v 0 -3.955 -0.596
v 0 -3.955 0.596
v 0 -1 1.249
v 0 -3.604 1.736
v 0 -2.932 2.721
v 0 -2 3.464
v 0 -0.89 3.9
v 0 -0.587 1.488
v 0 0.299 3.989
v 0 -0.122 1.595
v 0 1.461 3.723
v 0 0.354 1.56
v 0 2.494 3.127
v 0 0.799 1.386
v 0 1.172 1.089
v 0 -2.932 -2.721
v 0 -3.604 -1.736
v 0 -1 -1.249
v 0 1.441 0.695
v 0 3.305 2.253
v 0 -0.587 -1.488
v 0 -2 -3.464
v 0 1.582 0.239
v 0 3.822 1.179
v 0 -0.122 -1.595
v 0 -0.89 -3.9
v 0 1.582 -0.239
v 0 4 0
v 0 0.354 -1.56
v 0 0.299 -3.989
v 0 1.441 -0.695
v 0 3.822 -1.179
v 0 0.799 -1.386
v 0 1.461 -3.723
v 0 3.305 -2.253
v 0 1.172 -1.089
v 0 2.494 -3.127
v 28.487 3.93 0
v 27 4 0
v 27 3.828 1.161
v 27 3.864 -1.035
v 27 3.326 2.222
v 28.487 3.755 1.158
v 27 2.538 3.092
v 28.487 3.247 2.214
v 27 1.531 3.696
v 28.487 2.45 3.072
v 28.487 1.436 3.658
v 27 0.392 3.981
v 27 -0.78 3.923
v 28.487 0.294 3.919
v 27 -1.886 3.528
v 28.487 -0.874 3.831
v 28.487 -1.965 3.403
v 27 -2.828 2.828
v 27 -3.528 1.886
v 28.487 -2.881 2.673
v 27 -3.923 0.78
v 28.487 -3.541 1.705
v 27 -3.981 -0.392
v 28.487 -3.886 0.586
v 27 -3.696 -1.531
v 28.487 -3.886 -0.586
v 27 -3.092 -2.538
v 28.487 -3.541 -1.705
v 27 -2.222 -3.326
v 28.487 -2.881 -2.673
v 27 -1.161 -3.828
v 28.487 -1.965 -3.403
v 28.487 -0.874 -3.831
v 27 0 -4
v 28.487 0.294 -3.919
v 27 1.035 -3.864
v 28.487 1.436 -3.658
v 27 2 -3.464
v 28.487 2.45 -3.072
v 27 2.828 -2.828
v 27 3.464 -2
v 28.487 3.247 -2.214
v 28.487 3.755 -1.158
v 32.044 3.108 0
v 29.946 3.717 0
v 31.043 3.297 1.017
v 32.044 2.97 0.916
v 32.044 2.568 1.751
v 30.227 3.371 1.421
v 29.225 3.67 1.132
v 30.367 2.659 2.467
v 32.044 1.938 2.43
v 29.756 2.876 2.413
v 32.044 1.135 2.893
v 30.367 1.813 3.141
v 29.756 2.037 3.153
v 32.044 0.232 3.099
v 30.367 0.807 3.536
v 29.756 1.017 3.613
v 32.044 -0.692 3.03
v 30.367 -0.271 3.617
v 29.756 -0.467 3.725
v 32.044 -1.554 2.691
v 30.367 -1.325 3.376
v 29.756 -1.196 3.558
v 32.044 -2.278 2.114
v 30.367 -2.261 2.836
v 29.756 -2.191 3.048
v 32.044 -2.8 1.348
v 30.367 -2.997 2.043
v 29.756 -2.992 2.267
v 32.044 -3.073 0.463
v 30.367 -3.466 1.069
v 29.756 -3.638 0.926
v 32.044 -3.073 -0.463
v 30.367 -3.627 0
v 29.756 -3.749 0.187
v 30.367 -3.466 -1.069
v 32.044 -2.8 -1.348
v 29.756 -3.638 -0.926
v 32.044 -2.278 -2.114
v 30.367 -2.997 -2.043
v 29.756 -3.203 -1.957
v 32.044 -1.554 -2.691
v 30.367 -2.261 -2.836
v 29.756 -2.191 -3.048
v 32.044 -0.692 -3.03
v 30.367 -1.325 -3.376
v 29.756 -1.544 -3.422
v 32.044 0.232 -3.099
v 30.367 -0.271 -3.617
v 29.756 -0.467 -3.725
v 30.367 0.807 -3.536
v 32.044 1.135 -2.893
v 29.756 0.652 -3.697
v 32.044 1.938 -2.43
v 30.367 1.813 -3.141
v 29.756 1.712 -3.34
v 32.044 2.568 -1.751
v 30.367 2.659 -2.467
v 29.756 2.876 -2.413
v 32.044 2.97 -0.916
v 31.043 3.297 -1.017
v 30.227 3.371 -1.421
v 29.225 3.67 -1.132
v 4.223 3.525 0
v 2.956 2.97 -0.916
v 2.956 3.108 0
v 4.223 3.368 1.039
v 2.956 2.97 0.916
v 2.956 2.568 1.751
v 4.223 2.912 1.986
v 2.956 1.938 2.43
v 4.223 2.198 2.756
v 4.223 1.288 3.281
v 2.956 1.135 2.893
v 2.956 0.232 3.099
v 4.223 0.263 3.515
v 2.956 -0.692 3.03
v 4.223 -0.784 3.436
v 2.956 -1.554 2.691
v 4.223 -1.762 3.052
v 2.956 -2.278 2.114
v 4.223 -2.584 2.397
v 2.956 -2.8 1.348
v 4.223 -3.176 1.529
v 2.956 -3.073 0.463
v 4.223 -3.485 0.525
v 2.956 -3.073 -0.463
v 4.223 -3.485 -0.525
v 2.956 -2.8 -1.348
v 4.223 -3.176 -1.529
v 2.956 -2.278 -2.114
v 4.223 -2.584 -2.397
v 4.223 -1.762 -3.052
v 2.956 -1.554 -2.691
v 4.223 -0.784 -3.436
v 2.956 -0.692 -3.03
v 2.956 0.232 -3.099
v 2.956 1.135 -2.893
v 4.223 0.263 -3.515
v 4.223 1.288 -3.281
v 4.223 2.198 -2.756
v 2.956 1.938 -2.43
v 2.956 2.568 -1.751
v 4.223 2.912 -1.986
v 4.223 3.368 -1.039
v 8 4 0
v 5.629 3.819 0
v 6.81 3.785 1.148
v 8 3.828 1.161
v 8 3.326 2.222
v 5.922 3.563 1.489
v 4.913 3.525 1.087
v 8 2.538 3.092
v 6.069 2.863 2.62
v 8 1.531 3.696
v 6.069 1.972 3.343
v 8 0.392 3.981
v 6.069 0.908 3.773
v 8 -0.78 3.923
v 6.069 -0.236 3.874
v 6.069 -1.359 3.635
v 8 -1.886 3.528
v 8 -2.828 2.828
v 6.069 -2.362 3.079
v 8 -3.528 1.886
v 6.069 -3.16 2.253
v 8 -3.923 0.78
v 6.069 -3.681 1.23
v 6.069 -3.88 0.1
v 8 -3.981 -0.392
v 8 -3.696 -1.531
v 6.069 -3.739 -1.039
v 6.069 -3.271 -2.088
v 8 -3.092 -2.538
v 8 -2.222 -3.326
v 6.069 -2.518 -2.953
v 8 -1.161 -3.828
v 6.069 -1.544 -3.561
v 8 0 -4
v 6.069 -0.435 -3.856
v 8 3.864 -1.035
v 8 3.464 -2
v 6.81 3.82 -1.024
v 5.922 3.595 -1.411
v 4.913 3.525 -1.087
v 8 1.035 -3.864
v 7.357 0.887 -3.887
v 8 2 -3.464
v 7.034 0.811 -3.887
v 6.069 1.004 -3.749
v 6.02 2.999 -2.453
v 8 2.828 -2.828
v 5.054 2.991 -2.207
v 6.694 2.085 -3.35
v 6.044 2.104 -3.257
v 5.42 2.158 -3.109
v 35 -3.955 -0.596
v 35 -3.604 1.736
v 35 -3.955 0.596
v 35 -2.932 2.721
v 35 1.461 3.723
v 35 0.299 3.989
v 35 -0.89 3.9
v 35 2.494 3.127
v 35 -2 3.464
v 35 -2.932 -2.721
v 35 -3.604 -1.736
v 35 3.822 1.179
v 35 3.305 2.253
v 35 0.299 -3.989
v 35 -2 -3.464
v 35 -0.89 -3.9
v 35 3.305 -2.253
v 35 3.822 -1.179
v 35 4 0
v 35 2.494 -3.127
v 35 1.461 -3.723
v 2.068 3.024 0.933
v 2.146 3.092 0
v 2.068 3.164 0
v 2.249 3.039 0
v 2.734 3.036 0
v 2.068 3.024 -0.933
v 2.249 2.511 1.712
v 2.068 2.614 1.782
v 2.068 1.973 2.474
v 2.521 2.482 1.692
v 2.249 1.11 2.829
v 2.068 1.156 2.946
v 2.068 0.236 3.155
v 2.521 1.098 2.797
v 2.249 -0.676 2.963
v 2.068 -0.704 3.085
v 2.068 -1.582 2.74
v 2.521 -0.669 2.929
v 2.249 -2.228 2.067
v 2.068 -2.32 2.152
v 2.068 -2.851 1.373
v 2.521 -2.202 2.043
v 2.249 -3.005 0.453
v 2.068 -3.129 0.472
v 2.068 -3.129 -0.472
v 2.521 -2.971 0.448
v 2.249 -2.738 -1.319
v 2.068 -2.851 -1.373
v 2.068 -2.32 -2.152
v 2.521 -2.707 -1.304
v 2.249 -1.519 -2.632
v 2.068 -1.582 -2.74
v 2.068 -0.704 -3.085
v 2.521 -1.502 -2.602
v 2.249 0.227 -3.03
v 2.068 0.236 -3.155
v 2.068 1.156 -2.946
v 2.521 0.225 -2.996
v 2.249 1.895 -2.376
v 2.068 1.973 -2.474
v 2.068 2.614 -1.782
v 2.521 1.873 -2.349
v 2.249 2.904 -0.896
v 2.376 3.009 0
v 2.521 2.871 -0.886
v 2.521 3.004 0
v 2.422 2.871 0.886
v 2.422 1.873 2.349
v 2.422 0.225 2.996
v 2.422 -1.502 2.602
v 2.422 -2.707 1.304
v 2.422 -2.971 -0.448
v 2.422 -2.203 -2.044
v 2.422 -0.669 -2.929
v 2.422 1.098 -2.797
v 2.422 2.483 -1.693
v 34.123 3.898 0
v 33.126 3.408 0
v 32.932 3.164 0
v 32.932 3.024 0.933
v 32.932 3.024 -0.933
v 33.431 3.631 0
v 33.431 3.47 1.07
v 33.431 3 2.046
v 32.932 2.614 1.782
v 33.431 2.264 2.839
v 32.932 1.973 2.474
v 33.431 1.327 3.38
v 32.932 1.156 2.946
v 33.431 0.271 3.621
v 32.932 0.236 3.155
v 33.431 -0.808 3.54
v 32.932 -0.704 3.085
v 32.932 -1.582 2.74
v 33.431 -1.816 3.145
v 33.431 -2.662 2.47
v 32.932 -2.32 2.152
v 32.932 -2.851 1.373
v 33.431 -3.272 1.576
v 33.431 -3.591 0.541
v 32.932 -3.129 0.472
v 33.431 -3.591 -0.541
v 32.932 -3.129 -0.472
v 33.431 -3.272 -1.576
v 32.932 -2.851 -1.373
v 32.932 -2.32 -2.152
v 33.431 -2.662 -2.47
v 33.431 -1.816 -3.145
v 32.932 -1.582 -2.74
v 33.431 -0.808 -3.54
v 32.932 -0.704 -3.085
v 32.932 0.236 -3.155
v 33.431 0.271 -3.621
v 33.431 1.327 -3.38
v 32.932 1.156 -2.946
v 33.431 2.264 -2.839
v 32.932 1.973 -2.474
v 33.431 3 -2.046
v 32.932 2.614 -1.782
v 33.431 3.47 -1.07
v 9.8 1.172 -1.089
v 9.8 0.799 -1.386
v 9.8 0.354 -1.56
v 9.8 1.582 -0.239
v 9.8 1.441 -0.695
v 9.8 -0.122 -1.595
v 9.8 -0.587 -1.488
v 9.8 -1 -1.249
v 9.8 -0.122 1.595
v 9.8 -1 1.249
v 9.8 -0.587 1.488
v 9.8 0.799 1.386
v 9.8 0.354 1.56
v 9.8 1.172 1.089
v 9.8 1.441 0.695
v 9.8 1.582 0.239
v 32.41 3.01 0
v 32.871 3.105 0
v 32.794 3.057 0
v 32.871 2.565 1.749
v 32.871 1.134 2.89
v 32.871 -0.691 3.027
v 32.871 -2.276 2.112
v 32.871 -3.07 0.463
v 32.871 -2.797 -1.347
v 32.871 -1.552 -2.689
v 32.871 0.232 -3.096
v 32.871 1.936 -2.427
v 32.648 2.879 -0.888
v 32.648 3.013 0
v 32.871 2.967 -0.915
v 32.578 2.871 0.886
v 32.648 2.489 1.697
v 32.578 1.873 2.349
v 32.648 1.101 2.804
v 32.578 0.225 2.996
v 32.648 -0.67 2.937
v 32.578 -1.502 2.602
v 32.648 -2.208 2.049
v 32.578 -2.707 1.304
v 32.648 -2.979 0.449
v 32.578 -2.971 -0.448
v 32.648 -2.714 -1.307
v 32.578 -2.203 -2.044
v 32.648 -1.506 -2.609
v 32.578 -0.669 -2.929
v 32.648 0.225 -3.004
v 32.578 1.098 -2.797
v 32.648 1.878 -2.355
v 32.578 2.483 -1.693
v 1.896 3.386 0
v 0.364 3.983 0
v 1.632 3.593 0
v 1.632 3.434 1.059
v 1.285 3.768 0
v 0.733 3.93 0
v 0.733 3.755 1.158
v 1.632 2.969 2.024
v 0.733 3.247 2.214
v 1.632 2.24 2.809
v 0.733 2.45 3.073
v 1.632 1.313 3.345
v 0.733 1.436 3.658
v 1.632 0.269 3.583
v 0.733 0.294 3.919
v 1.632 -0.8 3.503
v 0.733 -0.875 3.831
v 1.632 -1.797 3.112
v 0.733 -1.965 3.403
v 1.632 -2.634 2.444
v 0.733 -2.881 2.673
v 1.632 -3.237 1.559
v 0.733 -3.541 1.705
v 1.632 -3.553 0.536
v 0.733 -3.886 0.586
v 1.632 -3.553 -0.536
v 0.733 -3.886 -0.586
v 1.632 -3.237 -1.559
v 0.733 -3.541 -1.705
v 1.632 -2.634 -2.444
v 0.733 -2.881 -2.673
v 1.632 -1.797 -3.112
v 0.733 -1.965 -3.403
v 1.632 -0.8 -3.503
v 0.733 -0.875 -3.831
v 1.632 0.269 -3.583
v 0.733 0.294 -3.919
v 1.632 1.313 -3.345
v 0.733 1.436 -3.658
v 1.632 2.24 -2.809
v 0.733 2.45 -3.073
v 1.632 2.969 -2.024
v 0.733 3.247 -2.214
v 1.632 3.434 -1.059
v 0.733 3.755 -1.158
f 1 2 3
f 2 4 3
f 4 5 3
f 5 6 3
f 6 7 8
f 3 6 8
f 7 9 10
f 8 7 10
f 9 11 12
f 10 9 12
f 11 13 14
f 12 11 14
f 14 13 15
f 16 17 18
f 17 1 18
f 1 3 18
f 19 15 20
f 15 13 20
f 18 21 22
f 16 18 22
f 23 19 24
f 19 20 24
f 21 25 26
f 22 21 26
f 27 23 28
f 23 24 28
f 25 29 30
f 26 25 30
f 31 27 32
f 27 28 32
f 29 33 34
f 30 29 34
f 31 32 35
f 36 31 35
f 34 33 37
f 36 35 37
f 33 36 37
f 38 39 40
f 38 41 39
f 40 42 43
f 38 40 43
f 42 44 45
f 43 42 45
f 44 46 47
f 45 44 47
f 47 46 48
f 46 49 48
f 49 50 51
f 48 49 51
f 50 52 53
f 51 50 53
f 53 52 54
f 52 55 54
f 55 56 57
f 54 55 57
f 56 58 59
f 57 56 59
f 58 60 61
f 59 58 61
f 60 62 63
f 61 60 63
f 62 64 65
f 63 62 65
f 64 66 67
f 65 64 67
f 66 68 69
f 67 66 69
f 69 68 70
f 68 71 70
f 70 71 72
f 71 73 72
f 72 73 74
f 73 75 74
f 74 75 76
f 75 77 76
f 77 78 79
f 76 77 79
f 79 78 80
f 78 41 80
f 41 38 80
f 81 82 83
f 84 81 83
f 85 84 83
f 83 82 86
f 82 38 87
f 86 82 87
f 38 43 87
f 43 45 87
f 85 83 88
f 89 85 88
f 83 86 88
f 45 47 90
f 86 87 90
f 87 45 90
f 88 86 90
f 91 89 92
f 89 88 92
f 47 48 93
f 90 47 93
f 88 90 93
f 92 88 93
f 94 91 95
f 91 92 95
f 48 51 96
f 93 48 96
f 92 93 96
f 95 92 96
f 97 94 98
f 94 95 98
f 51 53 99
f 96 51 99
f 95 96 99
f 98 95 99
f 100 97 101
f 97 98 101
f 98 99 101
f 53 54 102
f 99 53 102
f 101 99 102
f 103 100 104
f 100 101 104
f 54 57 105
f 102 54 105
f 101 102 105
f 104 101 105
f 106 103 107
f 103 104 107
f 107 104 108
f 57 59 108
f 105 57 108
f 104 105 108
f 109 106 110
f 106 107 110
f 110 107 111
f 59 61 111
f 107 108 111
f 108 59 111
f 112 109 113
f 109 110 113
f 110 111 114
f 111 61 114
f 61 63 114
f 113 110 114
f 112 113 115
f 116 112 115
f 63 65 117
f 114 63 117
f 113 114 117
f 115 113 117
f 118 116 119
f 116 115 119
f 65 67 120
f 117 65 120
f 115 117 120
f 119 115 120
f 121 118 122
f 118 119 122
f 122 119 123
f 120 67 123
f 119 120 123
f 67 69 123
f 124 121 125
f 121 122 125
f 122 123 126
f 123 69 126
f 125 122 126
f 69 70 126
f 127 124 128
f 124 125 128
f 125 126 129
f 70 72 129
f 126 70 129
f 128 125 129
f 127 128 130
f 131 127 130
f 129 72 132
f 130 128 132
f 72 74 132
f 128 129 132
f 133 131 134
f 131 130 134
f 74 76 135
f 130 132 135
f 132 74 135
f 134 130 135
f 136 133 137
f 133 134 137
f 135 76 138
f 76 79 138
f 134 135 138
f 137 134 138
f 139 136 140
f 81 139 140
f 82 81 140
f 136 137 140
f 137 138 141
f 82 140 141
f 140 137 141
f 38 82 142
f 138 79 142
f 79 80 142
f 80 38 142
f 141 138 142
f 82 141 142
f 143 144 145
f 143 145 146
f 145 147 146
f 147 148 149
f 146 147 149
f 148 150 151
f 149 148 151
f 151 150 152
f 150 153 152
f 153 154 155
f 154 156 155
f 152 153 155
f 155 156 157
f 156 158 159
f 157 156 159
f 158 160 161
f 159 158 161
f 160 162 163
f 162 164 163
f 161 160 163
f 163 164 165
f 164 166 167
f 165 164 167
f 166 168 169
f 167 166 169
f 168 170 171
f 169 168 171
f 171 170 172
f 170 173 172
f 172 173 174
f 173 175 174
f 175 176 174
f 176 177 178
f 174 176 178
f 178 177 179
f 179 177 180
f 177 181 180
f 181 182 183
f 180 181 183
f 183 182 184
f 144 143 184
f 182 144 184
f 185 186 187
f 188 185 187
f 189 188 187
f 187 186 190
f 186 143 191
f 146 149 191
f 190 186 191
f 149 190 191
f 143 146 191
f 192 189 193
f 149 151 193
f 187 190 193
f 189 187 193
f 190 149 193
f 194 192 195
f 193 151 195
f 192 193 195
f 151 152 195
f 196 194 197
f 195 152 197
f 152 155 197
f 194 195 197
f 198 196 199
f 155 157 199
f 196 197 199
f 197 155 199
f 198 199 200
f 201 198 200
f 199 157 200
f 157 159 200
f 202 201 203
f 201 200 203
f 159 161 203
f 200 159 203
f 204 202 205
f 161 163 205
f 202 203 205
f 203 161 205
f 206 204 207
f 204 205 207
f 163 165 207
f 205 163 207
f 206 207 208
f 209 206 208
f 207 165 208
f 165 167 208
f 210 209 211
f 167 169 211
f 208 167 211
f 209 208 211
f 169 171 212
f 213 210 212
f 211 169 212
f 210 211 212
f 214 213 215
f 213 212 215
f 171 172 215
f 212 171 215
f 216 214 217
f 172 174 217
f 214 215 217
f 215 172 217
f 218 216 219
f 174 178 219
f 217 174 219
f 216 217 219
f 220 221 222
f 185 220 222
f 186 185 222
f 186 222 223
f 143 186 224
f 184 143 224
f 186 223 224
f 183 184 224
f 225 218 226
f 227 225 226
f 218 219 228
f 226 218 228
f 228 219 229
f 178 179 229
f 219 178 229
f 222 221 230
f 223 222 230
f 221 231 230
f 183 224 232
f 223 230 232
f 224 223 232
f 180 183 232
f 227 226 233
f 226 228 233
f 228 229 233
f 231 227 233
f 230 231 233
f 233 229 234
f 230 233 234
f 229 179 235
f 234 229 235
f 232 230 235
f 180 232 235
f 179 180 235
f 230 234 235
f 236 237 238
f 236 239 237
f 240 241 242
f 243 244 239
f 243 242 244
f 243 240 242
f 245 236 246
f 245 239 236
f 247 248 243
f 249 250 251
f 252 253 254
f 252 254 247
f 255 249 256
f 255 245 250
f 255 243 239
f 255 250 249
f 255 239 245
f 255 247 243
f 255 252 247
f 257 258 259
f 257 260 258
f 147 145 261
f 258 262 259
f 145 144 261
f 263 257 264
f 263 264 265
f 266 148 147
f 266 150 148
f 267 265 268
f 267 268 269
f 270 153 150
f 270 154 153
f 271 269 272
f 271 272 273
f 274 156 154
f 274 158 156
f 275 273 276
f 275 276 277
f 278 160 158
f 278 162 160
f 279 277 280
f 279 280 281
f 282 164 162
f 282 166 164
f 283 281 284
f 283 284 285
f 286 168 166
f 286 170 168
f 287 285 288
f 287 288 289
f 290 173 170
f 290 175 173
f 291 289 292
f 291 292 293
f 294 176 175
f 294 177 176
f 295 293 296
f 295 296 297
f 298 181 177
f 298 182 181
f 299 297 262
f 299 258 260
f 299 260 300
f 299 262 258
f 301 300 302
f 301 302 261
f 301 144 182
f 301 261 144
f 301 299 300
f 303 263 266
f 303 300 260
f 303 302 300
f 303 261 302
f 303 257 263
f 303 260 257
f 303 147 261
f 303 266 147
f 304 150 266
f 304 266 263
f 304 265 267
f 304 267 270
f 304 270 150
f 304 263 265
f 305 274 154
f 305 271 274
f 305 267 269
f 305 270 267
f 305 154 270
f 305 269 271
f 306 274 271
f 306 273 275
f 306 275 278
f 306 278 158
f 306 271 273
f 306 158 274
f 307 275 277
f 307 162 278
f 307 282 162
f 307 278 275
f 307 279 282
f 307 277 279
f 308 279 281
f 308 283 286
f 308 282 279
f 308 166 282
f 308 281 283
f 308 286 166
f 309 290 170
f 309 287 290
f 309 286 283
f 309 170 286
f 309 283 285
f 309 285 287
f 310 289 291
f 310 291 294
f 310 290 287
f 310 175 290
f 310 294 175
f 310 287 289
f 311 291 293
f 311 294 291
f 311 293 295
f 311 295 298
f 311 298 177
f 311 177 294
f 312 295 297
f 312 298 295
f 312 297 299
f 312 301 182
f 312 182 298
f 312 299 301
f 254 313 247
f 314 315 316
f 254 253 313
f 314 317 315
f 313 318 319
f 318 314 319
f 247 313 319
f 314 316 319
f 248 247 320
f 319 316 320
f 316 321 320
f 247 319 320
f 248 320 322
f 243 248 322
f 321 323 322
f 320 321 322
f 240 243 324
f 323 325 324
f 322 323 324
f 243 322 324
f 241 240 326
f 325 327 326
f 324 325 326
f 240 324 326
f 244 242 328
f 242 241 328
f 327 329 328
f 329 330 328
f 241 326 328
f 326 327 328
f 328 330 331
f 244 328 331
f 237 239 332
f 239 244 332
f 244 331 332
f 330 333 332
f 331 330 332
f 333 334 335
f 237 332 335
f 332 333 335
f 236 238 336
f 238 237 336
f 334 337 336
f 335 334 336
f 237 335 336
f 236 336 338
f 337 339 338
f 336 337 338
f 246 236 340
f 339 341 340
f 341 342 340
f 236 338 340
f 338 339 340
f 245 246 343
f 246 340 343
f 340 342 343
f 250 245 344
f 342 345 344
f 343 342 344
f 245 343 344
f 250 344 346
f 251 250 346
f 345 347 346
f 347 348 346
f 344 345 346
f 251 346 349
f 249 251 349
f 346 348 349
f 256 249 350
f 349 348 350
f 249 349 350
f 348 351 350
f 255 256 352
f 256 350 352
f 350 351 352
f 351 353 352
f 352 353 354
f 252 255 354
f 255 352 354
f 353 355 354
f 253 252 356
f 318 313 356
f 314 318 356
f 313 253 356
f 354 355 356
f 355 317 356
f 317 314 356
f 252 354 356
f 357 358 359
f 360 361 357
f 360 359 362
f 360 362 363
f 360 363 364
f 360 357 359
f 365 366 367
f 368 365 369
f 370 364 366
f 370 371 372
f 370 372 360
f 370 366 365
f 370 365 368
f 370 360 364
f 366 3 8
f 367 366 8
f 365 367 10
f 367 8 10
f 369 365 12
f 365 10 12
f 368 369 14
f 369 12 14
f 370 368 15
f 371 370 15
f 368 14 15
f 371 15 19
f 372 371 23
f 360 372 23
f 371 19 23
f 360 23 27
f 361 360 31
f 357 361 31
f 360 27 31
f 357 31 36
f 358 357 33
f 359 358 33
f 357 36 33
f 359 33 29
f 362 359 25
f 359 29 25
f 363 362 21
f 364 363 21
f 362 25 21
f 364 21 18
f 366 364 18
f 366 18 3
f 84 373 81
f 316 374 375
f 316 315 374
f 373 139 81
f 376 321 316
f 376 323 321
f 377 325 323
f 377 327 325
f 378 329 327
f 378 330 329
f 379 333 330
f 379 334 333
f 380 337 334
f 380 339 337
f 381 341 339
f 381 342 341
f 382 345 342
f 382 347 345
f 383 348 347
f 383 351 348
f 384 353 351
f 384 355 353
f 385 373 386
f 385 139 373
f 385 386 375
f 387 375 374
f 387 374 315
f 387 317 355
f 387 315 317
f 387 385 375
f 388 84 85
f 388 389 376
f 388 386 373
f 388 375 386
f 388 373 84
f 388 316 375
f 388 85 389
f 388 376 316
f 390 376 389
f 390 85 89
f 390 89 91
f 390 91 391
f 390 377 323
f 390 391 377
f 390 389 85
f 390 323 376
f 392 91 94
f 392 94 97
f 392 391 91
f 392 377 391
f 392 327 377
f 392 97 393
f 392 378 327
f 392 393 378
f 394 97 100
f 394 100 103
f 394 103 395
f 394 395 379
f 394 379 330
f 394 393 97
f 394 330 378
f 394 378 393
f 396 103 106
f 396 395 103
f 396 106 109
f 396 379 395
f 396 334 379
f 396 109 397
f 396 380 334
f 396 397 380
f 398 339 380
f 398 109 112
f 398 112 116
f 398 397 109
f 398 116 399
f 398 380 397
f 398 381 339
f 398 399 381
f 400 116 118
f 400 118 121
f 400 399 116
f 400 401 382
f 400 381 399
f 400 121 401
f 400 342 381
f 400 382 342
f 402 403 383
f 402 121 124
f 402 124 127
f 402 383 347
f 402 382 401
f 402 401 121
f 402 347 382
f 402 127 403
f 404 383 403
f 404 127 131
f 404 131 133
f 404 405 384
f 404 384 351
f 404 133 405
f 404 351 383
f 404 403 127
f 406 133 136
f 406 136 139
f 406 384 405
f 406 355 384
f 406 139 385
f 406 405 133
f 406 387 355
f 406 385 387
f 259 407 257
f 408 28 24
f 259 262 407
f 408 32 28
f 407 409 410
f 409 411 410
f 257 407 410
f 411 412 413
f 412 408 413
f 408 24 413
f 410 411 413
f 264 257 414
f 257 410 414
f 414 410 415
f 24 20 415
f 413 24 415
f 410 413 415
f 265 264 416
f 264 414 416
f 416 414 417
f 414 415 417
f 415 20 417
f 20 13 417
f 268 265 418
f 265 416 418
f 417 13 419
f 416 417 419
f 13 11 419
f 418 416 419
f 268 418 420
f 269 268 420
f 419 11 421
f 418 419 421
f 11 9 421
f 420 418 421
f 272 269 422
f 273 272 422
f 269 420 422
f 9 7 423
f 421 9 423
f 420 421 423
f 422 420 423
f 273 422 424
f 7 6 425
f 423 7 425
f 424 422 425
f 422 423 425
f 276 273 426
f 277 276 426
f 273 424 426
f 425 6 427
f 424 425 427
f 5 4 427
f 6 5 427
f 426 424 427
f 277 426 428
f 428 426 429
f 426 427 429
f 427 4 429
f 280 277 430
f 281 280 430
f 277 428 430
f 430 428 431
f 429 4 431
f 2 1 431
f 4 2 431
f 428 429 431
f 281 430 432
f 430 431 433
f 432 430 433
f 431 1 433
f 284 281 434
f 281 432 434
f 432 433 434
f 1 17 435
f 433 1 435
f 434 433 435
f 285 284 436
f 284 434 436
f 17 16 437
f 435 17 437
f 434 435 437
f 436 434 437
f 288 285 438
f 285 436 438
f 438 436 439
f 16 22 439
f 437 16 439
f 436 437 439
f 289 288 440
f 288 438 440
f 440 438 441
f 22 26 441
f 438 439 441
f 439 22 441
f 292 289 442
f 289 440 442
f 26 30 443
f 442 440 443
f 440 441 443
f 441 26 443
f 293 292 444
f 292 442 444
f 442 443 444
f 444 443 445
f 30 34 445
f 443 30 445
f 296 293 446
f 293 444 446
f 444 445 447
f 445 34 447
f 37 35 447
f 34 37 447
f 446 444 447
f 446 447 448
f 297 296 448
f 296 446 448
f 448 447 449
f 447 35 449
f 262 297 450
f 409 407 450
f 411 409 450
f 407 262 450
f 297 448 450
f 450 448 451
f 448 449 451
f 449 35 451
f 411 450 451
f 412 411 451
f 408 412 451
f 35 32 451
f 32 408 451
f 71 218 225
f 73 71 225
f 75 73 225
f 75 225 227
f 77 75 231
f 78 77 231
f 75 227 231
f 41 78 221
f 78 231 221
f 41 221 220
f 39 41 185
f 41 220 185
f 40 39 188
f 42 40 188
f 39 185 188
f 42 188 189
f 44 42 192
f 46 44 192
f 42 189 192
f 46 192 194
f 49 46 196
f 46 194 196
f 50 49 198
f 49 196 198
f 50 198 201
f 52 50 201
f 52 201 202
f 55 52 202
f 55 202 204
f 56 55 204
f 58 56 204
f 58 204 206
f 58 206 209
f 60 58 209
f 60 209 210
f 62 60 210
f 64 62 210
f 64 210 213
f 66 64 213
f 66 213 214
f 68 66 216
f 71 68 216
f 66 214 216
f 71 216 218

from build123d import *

# Parameters (mm, degrees)
SKETCH2_R           = 4
BOSS_EXTRUDE1_DEPTH = 35
CUT_EXTRUDE1_DEPTH  = 9.8


with BuildPart() as part:
    # Sketch2 → Boss-Extrude1 (new body)
    with BuildSketch(Plane(origin=(0, 0, 0), x_dir=(0, 0, -1), z_dir=(1, 0, 0))):
        Circle(SKETCH2_R)
    extrude(amount=BOSS_EXTRUDE1_DEPTH)

    # Sketch3 → Cut-Extrude1 (cut)
    with BuildSketch(Plane.ZY):
        with BuildLine():
            Line((-1.2489996, -1), (1.2489996, -1))
            ThreePointArc((1.2489996, -1), (0, 1.6), (-1.2489996, -1))
        make_face()
    extrude(amount=-CUT_EXTRUDE1_DEPTH, mode=Mode.SUBTRACT)

    # Sketch4 → Cut-Revolve1 (revolve, cut)
    with BuildSketch(Plane.XY):
        with BuildLine():
            Line((0, 4), (8, 4))
            add(Edge.make_bspline(
                [(8, 4), (5.194687526, 4), (2.956130498, 3.107691813)],
                knots=[4.71238898, 4.71238898, 4.71238898, 5.359264748, 5.359264748, 5.359264748], degree=2, weights=[1, 0.948148367, 1]))
            add(Edge.make_bspline(
                [(2.068059433, 3.164260662), (2.318713674, 2.853611956), (2.956130498, 3.107691813)],
                knots=[0, 0, 0, 1.038649512, 1.038649512, 1.038649512], degree=2, weights=[1, 0.868154497, 1]))
            add(Edge.make_bspline(
                [(2.068059433, 3.164260662), (1.597970656, 4), (0, 4)],
                knots=[3.440188633, 3.440188633, 3.440188633, 4.71238898, 4.71238898, 4.71238898], degree=2, weights=[1, 0.804418611, 1]))
        make_face()
        with BuildLine():
            Line((27, 4), (35, 4))
            add(Edge.make_bspline(
                [(35, 4), (33.402029344, 4), (32.931940567, 3.164260662)],
                knots=[1.570796327, 1.570796327, 1.570796327, 2.842996674, 2.842996674, 2.842996674], degree=2, weights=[1, 0.804418611, 1]))
            add(Edge.make_bspline(
                [(32.043869502, 3.107691813), (32.681286326, 2.853611956), (32.931940567, 3.164260662)],
                knots=[2.102943141, 2.102943141, 2.102943141, 3.141592654, 3.141592654, 3.141592654], degree=2, weights=[1, 0.868154497, 1]))
            add(Edge.make_bspline(
                [(32.043869502, 3.107691813), (29.805312474, 4), (27, 4)],
                knots=[4.065513213, 4.065513213, 4.065513213, 4.71238898, 4.71238898, 4.71238898], degree=2, weights=[1, 0.948148367, 1]))
        make_face()
    revolve(axis=Axis((0, 0, 0), (1, 0, 0)), mode=Mode.SUBTRACT)


solid = part.part
